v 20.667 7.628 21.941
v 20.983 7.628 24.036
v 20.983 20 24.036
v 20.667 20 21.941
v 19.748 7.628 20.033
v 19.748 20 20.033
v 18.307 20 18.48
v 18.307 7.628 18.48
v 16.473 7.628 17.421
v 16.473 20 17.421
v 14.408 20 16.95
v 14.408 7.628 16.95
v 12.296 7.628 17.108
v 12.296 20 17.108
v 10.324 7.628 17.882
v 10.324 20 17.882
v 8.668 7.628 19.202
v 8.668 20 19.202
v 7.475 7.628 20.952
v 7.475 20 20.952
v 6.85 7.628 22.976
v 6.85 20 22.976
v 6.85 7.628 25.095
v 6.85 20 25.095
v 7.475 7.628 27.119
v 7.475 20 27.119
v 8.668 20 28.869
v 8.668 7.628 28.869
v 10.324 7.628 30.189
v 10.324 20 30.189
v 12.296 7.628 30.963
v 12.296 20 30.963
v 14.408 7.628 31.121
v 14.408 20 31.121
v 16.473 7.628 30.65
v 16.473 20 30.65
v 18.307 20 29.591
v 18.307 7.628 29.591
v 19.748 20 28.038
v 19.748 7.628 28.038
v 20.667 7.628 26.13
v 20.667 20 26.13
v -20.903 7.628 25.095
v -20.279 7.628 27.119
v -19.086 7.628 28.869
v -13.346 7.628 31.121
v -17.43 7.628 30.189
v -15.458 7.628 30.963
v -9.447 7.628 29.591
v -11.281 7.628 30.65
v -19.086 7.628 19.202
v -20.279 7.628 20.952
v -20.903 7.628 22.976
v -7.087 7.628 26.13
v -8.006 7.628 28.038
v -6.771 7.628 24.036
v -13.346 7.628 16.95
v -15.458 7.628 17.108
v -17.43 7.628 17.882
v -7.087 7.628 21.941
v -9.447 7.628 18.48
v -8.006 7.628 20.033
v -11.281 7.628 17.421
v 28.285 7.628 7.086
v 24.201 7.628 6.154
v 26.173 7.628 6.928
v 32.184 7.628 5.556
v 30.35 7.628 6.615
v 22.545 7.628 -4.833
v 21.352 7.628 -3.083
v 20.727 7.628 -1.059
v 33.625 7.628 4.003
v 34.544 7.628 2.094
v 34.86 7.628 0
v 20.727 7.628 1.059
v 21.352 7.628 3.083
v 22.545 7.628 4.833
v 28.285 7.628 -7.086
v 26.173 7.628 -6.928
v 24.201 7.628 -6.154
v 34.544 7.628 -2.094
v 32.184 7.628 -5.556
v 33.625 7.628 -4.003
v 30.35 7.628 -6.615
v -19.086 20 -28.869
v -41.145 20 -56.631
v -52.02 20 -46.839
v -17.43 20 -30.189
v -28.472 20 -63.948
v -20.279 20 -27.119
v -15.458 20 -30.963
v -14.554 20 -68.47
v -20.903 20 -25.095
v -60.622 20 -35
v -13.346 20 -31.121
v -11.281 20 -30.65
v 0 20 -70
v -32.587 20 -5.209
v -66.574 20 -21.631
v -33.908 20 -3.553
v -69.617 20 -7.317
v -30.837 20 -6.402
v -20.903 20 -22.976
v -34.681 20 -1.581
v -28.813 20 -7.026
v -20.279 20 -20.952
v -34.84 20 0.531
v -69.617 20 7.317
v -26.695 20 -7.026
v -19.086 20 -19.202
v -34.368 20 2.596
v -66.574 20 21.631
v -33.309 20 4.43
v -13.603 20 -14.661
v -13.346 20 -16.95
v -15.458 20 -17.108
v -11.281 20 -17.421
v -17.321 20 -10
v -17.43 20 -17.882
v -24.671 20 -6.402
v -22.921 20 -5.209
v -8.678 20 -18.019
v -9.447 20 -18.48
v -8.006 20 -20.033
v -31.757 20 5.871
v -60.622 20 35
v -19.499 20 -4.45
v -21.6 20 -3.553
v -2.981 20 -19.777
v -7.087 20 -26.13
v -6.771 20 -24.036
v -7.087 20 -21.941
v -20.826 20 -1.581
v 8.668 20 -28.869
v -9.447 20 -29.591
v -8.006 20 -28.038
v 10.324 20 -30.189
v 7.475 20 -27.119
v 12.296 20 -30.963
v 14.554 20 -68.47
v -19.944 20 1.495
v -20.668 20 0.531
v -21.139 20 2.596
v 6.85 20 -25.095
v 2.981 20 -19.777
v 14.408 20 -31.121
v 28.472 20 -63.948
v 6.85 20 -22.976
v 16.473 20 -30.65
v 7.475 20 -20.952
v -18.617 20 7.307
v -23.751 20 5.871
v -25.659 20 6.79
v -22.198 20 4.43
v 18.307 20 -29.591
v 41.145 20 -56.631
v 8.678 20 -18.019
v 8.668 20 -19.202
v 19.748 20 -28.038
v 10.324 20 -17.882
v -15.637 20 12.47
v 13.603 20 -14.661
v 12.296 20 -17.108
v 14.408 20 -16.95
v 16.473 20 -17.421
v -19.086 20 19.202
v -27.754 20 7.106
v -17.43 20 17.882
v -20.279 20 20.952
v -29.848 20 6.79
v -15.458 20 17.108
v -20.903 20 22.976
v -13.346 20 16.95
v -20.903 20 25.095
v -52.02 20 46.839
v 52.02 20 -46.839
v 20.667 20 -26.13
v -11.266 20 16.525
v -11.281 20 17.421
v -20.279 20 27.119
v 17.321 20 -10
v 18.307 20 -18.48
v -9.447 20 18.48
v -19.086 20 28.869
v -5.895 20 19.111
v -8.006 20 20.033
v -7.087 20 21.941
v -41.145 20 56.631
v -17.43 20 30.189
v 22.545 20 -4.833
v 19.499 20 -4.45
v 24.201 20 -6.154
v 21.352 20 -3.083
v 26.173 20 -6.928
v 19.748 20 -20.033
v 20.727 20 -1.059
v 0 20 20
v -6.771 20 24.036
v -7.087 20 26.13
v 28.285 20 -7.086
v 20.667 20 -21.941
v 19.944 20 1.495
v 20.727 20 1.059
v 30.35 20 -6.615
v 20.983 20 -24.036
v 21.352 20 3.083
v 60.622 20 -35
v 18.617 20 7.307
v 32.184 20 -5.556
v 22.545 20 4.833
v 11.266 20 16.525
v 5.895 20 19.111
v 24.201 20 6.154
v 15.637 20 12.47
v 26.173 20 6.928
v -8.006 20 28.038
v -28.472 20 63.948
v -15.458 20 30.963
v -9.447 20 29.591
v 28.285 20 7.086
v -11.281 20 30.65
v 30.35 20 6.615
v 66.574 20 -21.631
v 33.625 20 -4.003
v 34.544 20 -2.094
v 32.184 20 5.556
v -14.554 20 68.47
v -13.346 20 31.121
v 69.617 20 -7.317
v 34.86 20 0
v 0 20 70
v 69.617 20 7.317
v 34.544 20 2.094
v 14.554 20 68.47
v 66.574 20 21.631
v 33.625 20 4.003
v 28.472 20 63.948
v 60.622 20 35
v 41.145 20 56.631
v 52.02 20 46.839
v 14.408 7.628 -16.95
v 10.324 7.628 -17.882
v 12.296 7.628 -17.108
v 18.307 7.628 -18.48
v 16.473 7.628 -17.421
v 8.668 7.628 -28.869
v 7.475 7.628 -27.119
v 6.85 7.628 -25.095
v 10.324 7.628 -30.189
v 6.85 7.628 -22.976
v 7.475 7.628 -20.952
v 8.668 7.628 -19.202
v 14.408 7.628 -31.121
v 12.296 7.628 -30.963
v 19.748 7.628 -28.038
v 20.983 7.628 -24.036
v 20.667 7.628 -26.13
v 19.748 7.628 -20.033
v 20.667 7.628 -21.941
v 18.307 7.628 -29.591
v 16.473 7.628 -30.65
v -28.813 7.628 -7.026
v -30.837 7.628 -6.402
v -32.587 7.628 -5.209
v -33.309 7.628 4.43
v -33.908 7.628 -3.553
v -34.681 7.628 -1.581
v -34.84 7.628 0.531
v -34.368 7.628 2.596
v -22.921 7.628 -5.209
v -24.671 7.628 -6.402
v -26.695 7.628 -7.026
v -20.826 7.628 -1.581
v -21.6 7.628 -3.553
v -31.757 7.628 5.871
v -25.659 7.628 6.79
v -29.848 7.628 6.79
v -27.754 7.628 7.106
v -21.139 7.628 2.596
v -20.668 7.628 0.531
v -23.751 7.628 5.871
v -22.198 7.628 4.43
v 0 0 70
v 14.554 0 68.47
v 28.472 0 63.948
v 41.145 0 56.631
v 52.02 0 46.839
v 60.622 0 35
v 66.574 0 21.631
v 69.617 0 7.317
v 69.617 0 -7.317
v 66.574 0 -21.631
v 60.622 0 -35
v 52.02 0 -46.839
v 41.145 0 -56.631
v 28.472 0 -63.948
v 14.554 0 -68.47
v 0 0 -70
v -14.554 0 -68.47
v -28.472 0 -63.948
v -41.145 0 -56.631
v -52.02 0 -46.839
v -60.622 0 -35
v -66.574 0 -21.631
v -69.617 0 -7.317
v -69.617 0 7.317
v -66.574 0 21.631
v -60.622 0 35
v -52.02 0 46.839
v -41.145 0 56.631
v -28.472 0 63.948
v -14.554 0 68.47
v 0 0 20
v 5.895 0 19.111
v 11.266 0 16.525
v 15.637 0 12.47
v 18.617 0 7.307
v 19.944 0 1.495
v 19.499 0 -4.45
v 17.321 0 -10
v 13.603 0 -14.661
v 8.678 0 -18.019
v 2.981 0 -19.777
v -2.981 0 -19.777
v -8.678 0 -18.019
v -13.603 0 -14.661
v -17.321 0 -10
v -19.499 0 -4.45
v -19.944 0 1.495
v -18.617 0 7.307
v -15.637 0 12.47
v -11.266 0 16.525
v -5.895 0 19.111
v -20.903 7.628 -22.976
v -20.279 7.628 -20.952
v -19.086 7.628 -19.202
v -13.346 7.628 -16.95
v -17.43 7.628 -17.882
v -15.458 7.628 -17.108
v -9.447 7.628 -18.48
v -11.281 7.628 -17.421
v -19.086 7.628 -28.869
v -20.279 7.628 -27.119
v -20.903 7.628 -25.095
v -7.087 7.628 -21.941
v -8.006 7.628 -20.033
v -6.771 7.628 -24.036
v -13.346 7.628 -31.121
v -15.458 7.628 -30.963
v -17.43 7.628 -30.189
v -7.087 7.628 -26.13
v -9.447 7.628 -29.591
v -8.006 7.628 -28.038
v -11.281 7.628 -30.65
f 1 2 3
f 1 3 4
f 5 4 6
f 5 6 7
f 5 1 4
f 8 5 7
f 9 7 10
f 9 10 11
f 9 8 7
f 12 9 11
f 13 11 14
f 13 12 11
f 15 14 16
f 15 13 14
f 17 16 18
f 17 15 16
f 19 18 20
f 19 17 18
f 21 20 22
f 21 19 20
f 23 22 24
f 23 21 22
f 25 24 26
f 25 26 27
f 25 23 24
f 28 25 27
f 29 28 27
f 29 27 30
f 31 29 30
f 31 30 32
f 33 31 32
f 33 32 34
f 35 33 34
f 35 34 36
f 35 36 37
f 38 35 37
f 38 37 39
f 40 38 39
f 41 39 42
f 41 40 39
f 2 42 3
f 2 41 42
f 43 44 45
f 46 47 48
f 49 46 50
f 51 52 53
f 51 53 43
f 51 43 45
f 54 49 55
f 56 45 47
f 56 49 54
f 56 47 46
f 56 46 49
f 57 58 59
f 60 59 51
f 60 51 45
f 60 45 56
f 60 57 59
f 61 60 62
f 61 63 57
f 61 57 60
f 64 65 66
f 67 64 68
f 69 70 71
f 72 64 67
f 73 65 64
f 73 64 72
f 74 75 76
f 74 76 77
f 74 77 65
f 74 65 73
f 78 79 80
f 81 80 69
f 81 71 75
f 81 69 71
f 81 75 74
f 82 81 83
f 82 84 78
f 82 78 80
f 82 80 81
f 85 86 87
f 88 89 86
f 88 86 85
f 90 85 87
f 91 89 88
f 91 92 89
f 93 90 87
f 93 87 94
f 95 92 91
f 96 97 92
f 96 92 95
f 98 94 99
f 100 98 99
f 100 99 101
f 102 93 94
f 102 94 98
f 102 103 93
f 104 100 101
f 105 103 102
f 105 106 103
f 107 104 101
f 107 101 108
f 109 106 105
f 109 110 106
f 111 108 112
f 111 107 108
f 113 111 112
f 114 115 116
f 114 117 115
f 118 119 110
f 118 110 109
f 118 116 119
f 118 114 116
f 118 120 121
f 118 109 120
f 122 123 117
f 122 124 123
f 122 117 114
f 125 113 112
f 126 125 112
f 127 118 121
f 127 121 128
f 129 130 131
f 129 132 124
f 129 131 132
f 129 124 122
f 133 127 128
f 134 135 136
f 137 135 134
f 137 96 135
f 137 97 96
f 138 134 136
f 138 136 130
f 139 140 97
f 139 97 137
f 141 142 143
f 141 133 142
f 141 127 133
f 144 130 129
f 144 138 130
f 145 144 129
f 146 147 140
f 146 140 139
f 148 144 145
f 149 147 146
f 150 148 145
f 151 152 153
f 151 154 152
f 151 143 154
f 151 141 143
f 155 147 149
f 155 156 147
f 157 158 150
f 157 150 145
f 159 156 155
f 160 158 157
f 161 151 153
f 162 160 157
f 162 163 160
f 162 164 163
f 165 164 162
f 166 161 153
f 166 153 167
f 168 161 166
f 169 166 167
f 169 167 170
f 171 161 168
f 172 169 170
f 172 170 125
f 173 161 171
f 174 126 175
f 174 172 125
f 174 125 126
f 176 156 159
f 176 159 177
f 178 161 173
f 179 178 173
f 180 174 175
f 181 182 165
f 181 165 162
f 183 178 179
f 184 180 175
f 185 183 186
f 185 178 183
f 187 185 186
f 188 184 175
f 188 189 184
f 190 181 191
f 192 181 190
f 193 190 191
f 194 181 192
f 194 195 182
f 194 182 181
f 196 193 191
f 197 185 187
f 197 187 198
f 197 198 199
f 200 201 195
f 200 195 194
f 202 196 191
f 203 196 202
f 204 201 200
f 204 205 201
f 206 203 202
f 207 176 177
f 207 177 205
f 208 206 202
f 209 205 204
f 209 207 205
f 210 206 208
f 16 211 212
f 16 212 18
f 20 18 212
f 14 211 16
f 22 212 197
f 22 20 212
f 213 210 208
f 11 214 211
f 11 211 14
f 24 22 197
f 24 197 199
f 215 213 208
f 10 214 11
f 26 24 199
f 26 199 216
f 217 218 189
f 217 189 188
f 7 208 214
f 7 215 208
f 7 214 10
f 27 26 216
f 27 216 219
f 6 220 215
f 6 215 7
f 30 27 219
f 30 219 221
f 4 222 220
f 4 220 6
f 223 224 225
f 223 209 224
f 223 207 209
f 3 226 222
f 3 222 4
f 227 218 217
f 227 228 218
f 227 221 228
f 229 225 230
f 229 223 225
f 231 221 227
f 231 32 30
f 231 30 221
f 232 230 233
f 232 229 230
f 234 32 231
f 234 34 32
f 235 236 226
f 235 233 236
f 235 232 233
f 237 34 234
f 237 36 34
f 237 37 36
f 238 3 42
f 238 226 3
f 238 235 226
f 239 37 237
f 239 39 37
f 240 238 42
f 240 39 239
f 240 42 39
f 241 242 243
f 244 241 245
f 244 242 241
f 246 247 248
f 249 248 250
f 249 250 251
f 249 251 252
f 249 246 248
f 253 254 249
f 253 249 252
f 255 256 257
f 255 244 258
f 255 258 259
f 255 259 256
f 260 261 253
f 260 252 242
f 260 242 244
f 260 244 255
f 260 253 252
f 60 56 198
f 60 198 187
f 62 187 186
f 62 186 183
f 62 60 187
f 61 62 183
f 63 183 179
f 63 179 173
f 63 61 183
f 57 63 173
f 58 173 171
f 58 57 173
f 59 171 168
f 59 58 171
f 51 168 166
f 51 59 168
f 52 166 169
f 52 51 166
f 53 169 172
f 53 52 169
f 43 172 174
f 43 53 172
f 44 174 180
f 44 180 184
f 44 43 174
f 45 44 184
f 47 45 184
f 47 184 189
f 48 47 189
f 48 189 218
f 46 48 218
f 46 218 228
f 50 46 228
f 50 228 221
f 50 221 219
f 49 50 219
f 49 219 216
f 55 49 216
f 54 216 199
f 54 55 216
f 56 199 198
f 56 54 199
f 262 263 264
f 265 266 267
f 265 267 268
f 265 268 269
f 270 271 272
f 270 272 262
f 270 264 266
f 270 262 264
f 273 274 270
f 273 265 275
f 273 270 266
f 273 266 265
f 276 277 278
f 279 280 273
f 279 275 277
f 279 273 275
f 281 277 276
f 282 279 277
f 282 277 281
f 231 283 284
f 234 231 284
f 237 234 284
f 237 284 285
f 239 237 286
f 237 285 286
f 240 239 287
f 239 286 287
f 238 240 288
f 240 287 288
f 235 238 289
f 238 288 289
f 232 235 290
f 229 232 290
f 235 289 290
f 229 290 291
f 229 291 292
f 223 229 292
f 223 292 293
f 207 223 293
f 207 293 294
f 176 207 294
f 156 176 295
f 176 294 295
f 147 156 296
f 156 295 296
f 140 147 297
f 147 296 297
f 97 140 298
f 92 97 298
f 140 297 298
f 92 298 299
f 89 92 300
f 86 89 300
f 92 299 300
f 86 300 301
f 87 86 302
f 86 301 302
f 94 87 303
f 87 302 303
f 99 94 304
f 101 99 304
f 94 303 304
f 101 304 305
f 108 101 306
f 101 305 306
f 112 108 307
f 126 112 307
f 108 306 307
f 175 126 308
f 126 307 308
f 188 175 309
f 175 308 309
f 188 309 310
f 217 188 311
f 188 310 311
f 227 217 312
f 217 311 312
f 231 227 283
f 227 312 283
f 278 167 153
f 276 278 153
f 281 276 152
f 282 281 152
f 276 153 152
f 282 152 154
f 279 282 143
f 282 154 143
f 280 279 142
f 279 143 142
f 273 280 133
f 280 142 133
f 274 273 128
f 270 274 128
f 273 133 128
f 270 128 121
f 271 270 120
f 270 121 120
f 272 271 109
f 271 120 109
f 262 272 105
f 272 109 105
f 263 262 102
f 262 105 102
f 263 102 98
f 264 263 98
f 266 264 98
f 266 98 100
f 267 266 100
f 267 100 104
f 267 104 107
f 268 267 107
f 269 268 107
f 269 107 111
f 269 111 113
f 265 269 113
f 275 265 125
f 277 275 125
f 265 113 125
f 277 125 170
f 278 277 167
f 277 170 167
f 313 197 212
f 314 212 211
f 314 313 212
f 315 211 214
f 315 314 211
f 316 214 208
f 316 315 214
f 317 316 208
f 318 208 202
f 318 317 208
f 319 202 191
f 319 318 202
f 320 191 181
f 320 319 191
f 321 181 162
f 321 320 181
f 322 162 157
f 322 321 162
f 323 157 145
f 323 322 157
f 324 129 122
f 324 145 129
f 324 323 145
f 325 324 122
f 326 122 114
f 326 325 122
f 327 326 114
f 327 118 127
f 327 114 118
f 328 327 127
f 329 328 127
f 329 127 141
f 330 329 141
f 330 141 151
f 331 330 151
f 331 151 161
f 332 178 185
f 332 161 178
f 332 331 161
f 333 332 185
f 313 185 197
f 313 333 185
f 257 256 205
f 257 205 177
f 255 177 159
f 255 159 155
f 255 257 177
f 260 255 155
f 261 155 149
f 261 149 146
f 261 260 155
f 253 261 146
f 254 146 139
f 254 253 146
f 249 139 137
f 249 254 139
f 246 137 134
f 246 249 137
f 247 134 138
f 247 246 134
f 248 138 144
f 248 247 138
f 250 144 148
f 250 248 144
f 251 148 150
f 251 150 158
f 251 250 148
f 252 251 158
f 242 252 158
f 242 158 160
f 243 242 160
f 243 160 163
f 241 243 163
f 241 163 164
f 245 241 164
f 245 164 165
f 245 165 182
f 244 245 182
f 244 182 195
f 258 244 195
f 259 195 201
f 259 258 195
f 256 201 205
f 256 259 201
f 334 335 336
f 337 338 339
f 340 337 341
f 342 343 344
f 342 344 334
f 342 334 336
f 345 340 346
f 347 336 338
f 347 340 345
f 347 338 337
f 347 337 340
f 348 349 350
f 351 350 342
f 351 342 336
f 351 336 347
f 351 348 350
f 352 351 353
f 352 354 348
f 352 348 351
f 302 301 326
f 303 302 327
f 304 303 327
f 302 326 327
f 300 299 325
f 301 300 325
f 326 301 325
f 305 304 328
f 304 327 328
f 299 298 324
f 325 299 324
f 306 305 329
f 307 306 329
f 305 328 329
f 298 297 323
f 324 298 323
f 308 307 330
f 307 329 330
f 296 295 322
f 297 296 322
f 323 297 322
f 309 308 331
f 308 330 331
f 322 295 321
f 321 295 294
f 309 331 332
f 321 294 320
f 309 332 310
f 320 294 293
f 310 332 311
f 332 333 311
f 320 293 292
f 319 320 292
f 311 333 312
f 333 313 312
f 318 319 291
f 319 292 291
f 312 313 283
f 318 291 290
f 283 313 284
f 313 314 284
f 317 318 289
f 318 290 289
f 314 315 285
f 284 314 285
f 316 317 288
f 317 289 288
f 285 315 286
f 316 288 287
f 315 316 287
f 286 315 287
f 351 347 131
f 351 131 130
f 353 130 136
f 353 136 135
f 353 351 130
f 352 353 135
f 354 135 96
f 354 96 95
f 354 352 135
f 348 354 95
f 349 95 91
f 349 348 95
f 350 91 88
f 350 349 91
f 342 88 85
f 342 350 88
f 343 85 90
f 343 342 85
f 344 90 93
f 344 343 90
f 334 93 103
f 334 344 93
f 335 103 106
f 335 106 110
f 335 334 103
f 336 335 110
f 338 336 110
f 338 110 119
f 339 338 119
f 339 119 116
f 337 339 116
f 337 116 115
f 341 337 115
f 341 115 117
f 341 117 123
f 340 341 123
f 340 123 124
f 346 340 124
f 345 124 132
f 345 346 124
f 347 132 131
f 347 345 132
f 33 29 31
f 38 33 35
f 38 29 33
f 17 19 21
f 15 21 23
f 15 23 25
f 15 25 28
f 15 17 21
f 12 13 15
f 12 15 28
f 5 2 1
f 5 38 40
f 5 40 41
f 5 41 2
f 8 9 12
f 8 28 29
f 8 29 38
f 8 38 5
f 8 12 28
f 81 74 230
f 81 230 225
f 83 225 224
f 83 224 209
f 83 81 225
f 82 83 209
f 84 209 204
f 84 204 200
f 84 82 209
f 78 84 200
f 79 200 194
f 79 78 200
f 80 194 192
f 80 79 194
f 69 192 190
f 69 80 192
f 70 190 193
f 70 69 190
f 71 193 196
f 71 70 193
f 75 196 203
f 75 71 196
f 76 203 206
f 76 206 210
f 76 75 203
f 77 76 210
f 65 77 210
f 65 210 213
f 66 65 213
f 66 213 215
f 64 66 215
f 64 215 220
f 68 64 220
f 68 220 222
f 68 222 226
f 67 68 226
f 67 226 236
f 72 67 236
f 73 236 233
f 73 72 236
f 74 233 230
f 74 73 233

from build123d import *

# Parameters (mm, degrees)
SKETCH1_R           = 70
BOSS_EXTRUDE1_DEPTH = 20
SKETCH2_R           = 20
CUT_EXTRUDE1_DEPTH  = 101.995049384
SKETCH3_R           = 7.105797858
CUT_EXTRUDE2_DEPTH  = 12.372306178
CIRPATTERN1_COUNT   = 6


with BuildPart() as part:
    # Sketch1 → Boss-Extrude1 (new body)
    with BuildSketch(Plane(origin=(0, 0, 0), x_dir=(1, 0, 0), z_dir=(0, 1, 0))):
        Circle(SKETCH1_R)
    extrude(amount=BOSS_EXTRUDE1_DEPTH)

    # Sketch2 → Cut-Extrude1 (cut, through all)
    with BuildSketch(Plane(origin=(0, 0, 0), x_dir=(1, 0, 0), z_dir=(0, 1, 0))):
        Circle(SKETCH2_R)
    extrude(amount=CUT_EXTRUDE1_DEPTH, mode=Mode.SUBTRACT)

    # Sketch3 → Cut-Extrude2 (cut)
    with BuildSketch(Plane(origin=(0, 20, 0), x_dir=(1, 0, 0), z_dir=(0, 1, 0))):
        with Locations((-27.753811795, 0)):
            Circle(SKETCH3_R)
    cut_extrude2 = extrude(amount=-CUT_EXTRUDE2_DEPTH, mode=Mode.SUBTRACT)

    # CirPattern1: Cut-Extrude2 ×6 about axis
    cirpattern1_axis = Axis((0, 0, 0), (0, 1, 0))
    for i in range(1, CIRPATTERN1_COUNT):
        add(cut_extrude2.rotate(cirpattern1_axis, i * 360 / CIRPATTERN1_COUNT), mode=Mode.SUBTRACT)


solid = part.part
